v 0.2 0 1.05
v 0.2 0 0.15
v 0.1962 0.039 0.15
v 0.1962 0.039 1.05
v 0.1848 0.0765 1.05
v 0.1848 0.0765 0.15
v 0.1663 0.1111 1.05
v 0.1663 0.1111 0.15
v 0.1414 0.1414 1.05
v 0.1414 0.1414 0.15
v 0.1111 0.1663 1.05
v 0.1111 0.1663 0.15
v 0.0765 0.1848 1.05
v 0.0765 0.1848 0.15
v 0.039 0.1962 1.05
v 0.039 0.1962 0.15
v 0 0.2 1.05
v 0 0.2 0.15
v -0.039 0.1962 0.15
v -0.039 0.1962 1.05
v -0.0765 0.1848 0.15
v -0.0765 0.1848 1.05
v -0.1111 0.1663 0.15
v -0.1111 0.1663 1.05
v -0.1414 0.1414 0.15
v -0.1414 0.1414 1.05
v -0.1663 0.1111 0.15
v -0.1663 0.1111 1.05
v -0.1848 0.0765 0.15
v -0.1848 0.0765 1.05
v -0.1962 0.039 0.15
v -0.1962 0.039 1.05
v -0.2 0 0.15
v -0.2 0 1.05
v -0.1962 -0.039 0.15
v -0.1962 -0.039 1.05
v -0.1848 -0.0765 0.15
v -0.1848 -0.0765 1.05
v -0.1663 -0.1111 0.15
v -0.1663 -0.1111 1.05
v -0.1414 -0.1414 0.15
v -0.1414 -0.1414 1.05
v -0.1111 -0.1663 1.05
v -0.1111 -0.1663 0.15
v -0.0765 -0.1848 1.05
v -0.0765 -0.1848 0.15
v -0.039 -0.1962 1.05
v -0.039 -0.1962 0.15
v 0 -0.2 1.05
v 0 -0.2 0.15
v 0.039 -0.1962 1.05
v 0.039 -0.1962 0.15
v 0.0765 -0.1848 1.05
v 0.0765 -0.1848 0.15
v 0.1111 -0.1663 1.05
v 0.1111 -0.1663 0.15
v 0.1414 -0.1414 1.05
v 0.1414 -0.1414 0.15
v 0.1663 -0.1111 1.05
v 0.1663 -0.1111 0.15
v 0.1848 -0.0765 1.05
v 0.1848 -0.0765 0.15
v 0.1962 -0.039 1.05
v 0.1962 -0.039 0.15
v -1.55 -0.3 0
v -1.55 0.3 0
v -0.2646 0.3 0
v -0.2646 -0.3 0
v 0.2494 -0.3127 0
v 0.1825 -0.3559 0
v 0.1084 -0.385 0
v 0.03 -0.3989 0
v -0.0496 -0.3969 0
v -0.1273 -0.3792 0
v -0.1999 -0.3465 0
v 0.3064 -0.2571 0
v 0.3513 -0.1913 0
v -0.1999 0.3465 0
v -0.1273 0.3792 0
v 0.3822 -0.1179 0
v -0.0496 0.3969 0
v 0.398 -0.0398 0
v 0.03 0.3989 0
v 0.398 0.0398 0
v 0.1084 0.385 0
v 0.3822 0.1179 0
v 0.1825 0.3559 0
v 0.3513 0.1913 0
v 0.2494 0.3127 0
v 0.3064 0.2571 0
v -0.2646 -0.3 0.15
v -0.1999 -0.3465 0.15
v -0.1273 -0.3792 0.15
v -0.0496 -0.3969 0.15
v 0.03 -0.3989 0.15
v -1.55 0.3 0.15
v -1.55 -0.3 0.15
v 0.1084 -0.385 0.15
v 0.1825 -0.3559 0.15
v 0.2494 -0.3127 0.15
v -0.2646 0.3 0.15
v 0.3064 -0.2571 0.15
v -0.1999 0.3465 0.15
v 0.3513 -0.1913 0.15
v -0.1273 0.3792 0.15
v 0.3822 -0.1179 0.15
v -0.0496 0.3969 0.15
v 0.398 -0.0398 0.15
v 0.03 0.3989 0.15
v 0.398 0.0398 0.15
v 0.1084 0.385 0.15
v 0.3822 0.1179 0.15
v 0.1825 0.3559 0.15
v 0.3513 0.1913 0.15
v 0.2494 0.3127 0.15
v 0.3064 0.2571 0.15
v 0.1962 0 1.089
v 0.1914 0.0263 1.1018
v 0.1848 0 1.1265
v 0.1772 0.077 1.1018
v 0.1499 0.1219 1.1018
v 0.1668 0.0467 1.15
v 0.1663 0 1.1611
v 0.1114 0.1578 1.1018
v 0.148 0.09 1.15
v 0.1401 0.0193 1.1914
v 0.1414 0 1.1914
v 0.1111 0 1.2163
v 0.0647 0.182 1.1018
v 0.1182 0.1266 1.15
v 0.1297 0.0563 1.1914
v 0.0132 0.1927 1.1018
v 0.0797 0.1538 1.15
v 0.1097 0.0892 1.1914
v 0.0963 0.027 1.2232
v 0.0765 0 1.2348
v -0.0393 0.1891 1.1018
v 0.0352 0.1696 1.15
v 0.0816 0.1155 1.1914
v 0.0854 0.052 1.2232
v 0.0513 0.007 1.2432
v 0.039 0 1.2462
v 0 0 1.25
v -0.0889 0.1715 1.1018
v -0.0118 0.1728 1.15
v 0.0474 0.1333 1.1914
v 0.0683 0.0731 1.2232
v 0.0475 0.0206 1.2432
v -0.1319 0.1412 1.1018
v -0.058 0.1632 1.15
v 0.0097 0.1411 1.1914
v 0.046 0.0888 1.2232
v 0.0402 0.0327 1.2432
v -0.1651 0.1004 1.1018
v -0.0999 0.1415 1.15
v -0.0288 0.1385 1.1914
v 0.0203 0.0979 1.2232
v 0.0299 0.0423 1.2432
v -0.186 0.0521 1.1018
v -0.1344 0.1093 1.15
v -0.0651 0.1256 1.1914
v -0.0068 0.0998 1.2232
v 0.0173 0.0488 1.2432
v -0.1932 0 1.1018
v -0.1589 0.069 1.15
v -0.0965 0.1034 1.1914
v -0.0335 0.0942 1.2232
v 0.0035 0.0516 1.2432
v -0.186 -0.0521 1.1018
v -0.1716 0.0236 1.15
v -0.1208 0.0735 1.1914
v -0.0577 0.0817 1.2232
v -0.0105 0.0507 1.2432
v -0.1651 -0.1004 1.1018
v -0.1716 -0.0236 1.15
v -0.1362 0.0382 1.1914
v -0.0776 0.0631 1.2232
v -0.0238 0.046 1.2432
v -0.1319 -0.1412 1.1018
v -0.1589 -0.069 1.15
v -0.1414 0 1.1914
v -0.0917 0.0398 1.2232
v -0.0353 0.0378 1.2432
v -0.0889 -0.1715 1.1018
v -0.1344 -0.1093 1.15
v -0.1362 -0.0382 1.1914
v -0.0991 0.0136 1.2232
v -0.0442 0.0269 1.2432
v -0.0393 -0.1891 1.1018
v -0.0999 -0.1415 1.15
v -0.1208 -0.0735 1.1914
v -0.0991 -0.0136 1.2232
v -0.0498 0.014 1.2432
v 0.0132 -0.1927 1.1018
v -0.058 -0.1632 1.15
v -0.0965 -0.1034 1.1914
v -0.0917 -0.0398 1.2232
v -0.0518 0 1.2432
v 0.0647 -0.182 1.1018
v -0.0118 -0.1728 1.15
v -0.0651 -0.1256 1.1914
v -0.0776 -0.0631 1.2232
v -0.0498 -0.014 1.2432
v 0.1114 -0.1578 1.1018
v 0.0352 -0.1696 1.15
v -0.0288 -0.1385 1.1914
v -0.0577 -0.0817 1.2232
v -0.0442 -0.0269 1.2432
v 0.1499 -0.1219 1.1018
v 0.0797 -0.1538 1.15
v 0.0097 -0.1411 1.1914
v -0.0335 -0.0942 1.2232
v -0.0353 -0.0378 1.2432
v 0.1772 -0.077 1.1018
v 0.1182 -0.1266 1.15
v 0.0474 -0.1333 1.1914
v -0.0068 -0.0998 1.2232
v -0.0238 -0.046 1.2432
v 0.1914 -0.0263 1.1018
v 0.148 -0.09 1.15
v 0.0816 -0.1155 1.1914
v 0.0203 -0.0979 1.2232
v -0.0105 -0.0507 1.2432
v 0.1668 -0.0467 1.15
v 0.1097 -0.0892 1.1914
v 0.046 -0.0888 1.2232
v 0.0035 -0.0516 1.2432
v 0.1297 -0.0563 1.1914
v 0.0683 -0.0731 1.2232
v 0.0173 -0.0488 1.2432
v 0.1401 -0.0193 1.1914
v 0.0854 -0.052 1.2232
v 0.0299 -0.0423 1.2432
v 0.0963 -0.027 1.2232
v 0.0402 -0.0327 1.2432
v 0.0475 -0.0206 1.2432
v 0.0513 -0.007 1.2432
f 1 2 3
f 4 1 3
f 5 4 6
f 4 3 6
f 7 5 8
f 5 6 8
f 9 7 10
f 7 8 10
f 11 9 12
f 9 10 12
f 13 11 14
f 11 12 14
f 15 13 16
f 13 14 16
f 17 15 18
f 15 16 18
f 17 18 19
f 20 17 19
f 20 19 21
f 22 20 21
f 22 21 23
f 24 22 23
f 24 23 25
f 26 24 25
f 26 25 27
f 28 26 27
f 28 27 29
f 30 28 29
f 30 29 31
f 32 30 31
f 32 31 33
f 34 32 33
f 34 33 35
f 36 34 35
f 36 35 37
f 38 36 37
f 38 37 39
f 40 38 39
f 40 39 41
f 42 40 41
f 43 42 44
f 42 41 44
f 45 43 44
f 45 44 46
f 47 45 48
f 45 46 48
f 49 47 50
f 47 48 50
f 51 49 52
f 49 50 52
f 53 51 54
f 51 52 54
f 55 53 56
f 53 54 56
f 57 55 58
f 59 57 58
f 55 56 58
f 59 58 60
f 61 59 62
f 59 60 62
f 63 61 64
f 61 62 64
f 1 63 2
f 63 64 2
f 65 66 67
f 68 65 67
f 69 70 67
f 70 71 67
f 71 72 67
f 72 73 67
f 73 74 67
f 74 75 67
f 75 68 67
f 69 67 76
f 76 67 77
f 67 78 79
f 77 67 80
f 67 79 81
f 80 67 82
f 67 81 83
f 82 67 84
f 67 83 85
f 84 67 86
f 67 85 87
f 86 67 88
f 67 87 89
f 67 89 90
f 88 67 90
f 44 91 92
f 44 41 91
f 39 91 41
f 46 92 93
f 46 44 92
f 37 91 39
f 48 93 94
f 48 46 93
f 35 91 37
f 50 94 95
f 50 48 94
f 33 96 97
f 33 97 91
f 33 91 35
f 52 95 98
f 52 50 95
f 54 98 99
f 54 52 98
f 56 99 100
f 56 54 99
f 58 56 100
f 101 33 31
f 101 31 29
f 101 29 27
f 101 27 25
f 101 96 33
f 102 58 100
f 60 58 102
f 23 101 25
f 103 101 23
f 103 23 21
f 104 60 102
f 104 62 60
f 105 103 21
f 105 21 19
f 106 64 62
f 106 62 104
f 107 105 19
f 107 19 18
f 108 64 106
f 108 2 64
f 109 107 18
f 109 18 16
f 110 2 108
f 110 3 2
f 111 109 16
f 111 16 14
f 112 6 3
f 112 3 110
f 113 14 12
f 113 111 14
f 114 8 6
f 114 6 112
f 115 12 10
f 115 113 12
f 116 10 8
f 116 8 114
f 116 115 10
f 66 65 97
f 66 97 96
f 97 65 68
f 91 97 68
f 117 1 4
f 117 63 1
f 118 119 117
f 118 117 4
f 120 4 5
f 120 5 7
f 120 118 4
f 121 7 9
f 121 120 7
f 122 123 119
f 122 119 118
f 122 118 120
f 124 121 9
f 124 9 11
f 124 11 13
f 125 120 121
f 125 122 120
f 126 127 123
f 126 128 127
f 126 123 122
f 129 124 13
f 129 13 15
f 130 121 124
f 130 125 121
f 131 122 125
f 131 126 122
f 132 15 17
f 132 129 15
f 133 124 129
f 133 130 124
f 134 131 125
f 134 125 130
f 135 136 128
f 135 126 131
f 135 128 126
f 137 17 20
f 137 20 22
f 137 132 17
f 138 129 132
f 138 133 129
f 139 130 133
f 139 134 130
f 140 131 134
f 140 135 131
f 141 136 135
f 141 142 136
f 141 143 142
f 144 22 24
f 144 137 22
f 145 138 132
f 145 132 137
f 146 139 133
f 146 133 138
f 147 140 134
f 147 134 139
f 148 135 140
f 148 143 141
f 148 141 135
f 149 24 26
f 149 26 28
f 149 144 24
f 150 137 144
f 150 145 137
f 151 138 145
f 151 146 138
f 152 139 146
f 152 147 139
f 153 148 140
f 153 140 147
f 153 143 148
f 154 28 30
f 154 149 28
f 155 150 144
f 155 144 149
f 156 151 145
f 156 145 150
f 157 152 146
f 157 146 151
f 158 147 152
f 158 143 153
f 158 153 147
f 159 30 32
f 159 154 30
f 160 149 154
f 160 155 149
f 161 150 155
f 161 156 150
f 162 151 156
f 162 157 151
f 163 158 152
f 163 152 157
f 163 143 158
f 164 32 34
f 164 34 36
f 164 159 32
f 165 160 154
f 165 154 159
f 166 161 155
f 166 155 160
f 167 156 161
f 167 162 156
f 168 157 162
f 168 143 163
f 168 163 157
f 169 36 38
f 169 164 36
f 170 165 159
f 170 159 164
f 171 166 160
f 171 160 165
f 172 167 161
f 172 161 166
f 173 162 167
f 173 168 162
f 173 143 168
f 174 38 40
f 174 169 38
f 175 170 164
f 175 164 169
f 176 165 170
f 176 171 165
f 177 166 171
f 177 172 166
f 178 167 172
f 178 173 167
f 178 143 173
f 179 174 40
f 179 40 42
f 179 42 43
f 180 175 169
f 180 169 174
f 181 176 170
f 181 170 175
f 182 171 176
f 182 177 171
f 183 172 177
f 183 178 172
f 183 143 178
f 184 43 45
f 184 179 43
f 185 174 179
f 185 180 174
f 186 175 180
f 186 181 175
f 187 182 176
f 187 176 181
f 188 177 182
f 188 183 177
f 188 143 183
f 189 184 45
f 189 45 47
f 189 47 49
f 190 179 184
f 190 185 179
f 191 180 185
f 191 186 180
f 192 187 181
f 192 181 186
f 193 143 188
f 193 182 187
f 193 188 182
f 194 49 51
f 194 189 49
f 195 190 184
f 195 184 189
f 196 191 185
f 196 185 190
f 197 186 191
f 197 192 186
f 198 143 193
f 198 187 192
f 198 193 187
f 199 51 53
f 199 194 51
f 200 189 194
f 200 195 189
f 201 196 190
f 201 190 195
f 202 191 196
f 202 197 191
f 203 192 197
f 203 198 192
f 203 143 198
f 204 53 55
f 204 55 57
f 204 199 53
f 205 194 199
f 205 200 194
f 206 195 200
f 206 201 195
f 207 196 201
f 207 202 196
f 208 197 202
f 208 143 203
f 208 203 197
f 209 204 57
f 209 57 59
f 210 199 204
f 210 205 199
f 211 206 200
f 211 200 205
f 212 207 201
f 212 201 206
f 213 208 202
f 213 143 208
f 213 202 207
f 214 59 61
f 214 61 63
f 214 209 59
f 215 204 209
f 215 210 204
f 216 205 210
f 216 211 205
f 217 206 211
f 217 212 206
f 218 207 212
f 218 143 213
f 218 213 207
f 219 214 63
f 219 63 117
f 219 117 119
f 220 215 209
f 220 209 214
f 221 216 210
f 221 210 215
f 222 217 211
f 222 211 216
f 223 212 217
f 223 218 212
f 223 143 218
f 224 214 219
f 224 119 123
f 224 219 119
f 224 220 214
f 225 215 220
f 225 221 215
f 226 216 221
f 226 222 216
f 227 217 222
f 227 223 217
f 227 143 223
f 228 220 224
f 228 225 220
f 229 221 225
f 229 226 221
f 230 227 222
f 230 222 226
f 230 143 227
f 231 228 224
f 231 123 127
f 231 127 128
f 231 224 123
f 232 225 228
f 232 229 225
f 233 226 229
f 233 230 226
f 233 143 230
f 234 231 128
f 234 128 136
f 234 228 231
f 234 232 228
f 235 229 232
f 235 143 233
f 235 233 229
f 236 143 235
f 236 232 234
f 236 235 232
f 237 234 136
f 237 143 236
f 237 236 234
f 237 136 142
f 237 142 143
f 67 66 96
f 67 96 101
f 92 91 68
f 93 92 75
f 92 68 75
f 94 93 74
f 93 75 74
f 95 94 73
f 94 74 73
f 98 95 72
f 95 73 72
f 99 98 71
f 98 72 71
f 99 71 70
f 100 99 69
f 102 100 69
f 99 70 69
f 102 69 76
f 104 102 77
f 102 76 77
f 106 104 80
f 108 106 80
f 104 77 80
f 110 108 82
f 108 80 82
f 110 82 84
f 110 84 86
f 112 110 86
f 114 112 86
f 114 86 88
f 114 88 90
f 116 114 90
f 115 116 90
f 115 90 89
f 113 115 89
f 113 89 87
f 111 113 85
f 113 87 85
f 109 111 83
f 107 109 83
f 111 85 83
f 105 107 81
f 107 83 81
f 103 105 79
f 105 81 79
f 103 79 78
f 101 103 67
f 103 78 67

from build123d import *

# Parameters (mm, degrees)
BOX003_W          = 1.55
BOX003_H          = 0.6
BOX003_DEPTH      = 0.15
CYLINDER001_R     = 0.2
CYLINDER001_DEPTH = 1.25
CYLINDER_R        = 0.4
CYLINDER_DEPTH    = 0.15
FILLET001_R       = 0.2


with BuildPart() as cube003:
    # Box003 → Box003 (new body)
    with BuildSketch(Plane(origin=(-0.25, 1, 0), x_dir=(1, 0, 0), z_dir=(0, 0, 1))):
        with Locations((0.775, 0.3)):
            Rectangle(BOX003_W, BOX003_H)
    extrude(amount=BOX003_DEPTH)


with BuildPart() as cylinder001:
    # Cylinder001 → Cylinder001 (new body)
    with BuildSketch(Plane(origin=(1.3, 1.3, 0), x_dir=(1, 0, 0), z_dir=(0, 0, 1))):
        Circle(CYLINDER001_R)
    extrude(amount=CYLINDER001_DEPTH)


with BuildPart() as pin:
    # Cylinder → Cylinder (new body)
    with BuildSketch(Plane(origin=(1.3, 1.3, 0), x_dir=(1, 0, 0), z_dir=(0, 0, 1))):
        Circle(CYLINDER_R)
    extrude(amount=CYLINDER_DEPTH)

    # Fusion001: union Cube003, Cylinder001
    add(cube003.part)
    add(cylinder001.part)

    # Fillet001
    fillet001_edges = [pin.edges().sort_by_distance(p)[0] for p in [
        (1.1, 1.3, 1.25),
    ]]
    fillet(fillet001_edges, radius=FILLET001_R)


with BuildPart() as pin_1:
    # Fillet001 placement: moved
    add(pin.part.moved(Location((-1.3, -1.3, 0))))


solid = pin_1.part
